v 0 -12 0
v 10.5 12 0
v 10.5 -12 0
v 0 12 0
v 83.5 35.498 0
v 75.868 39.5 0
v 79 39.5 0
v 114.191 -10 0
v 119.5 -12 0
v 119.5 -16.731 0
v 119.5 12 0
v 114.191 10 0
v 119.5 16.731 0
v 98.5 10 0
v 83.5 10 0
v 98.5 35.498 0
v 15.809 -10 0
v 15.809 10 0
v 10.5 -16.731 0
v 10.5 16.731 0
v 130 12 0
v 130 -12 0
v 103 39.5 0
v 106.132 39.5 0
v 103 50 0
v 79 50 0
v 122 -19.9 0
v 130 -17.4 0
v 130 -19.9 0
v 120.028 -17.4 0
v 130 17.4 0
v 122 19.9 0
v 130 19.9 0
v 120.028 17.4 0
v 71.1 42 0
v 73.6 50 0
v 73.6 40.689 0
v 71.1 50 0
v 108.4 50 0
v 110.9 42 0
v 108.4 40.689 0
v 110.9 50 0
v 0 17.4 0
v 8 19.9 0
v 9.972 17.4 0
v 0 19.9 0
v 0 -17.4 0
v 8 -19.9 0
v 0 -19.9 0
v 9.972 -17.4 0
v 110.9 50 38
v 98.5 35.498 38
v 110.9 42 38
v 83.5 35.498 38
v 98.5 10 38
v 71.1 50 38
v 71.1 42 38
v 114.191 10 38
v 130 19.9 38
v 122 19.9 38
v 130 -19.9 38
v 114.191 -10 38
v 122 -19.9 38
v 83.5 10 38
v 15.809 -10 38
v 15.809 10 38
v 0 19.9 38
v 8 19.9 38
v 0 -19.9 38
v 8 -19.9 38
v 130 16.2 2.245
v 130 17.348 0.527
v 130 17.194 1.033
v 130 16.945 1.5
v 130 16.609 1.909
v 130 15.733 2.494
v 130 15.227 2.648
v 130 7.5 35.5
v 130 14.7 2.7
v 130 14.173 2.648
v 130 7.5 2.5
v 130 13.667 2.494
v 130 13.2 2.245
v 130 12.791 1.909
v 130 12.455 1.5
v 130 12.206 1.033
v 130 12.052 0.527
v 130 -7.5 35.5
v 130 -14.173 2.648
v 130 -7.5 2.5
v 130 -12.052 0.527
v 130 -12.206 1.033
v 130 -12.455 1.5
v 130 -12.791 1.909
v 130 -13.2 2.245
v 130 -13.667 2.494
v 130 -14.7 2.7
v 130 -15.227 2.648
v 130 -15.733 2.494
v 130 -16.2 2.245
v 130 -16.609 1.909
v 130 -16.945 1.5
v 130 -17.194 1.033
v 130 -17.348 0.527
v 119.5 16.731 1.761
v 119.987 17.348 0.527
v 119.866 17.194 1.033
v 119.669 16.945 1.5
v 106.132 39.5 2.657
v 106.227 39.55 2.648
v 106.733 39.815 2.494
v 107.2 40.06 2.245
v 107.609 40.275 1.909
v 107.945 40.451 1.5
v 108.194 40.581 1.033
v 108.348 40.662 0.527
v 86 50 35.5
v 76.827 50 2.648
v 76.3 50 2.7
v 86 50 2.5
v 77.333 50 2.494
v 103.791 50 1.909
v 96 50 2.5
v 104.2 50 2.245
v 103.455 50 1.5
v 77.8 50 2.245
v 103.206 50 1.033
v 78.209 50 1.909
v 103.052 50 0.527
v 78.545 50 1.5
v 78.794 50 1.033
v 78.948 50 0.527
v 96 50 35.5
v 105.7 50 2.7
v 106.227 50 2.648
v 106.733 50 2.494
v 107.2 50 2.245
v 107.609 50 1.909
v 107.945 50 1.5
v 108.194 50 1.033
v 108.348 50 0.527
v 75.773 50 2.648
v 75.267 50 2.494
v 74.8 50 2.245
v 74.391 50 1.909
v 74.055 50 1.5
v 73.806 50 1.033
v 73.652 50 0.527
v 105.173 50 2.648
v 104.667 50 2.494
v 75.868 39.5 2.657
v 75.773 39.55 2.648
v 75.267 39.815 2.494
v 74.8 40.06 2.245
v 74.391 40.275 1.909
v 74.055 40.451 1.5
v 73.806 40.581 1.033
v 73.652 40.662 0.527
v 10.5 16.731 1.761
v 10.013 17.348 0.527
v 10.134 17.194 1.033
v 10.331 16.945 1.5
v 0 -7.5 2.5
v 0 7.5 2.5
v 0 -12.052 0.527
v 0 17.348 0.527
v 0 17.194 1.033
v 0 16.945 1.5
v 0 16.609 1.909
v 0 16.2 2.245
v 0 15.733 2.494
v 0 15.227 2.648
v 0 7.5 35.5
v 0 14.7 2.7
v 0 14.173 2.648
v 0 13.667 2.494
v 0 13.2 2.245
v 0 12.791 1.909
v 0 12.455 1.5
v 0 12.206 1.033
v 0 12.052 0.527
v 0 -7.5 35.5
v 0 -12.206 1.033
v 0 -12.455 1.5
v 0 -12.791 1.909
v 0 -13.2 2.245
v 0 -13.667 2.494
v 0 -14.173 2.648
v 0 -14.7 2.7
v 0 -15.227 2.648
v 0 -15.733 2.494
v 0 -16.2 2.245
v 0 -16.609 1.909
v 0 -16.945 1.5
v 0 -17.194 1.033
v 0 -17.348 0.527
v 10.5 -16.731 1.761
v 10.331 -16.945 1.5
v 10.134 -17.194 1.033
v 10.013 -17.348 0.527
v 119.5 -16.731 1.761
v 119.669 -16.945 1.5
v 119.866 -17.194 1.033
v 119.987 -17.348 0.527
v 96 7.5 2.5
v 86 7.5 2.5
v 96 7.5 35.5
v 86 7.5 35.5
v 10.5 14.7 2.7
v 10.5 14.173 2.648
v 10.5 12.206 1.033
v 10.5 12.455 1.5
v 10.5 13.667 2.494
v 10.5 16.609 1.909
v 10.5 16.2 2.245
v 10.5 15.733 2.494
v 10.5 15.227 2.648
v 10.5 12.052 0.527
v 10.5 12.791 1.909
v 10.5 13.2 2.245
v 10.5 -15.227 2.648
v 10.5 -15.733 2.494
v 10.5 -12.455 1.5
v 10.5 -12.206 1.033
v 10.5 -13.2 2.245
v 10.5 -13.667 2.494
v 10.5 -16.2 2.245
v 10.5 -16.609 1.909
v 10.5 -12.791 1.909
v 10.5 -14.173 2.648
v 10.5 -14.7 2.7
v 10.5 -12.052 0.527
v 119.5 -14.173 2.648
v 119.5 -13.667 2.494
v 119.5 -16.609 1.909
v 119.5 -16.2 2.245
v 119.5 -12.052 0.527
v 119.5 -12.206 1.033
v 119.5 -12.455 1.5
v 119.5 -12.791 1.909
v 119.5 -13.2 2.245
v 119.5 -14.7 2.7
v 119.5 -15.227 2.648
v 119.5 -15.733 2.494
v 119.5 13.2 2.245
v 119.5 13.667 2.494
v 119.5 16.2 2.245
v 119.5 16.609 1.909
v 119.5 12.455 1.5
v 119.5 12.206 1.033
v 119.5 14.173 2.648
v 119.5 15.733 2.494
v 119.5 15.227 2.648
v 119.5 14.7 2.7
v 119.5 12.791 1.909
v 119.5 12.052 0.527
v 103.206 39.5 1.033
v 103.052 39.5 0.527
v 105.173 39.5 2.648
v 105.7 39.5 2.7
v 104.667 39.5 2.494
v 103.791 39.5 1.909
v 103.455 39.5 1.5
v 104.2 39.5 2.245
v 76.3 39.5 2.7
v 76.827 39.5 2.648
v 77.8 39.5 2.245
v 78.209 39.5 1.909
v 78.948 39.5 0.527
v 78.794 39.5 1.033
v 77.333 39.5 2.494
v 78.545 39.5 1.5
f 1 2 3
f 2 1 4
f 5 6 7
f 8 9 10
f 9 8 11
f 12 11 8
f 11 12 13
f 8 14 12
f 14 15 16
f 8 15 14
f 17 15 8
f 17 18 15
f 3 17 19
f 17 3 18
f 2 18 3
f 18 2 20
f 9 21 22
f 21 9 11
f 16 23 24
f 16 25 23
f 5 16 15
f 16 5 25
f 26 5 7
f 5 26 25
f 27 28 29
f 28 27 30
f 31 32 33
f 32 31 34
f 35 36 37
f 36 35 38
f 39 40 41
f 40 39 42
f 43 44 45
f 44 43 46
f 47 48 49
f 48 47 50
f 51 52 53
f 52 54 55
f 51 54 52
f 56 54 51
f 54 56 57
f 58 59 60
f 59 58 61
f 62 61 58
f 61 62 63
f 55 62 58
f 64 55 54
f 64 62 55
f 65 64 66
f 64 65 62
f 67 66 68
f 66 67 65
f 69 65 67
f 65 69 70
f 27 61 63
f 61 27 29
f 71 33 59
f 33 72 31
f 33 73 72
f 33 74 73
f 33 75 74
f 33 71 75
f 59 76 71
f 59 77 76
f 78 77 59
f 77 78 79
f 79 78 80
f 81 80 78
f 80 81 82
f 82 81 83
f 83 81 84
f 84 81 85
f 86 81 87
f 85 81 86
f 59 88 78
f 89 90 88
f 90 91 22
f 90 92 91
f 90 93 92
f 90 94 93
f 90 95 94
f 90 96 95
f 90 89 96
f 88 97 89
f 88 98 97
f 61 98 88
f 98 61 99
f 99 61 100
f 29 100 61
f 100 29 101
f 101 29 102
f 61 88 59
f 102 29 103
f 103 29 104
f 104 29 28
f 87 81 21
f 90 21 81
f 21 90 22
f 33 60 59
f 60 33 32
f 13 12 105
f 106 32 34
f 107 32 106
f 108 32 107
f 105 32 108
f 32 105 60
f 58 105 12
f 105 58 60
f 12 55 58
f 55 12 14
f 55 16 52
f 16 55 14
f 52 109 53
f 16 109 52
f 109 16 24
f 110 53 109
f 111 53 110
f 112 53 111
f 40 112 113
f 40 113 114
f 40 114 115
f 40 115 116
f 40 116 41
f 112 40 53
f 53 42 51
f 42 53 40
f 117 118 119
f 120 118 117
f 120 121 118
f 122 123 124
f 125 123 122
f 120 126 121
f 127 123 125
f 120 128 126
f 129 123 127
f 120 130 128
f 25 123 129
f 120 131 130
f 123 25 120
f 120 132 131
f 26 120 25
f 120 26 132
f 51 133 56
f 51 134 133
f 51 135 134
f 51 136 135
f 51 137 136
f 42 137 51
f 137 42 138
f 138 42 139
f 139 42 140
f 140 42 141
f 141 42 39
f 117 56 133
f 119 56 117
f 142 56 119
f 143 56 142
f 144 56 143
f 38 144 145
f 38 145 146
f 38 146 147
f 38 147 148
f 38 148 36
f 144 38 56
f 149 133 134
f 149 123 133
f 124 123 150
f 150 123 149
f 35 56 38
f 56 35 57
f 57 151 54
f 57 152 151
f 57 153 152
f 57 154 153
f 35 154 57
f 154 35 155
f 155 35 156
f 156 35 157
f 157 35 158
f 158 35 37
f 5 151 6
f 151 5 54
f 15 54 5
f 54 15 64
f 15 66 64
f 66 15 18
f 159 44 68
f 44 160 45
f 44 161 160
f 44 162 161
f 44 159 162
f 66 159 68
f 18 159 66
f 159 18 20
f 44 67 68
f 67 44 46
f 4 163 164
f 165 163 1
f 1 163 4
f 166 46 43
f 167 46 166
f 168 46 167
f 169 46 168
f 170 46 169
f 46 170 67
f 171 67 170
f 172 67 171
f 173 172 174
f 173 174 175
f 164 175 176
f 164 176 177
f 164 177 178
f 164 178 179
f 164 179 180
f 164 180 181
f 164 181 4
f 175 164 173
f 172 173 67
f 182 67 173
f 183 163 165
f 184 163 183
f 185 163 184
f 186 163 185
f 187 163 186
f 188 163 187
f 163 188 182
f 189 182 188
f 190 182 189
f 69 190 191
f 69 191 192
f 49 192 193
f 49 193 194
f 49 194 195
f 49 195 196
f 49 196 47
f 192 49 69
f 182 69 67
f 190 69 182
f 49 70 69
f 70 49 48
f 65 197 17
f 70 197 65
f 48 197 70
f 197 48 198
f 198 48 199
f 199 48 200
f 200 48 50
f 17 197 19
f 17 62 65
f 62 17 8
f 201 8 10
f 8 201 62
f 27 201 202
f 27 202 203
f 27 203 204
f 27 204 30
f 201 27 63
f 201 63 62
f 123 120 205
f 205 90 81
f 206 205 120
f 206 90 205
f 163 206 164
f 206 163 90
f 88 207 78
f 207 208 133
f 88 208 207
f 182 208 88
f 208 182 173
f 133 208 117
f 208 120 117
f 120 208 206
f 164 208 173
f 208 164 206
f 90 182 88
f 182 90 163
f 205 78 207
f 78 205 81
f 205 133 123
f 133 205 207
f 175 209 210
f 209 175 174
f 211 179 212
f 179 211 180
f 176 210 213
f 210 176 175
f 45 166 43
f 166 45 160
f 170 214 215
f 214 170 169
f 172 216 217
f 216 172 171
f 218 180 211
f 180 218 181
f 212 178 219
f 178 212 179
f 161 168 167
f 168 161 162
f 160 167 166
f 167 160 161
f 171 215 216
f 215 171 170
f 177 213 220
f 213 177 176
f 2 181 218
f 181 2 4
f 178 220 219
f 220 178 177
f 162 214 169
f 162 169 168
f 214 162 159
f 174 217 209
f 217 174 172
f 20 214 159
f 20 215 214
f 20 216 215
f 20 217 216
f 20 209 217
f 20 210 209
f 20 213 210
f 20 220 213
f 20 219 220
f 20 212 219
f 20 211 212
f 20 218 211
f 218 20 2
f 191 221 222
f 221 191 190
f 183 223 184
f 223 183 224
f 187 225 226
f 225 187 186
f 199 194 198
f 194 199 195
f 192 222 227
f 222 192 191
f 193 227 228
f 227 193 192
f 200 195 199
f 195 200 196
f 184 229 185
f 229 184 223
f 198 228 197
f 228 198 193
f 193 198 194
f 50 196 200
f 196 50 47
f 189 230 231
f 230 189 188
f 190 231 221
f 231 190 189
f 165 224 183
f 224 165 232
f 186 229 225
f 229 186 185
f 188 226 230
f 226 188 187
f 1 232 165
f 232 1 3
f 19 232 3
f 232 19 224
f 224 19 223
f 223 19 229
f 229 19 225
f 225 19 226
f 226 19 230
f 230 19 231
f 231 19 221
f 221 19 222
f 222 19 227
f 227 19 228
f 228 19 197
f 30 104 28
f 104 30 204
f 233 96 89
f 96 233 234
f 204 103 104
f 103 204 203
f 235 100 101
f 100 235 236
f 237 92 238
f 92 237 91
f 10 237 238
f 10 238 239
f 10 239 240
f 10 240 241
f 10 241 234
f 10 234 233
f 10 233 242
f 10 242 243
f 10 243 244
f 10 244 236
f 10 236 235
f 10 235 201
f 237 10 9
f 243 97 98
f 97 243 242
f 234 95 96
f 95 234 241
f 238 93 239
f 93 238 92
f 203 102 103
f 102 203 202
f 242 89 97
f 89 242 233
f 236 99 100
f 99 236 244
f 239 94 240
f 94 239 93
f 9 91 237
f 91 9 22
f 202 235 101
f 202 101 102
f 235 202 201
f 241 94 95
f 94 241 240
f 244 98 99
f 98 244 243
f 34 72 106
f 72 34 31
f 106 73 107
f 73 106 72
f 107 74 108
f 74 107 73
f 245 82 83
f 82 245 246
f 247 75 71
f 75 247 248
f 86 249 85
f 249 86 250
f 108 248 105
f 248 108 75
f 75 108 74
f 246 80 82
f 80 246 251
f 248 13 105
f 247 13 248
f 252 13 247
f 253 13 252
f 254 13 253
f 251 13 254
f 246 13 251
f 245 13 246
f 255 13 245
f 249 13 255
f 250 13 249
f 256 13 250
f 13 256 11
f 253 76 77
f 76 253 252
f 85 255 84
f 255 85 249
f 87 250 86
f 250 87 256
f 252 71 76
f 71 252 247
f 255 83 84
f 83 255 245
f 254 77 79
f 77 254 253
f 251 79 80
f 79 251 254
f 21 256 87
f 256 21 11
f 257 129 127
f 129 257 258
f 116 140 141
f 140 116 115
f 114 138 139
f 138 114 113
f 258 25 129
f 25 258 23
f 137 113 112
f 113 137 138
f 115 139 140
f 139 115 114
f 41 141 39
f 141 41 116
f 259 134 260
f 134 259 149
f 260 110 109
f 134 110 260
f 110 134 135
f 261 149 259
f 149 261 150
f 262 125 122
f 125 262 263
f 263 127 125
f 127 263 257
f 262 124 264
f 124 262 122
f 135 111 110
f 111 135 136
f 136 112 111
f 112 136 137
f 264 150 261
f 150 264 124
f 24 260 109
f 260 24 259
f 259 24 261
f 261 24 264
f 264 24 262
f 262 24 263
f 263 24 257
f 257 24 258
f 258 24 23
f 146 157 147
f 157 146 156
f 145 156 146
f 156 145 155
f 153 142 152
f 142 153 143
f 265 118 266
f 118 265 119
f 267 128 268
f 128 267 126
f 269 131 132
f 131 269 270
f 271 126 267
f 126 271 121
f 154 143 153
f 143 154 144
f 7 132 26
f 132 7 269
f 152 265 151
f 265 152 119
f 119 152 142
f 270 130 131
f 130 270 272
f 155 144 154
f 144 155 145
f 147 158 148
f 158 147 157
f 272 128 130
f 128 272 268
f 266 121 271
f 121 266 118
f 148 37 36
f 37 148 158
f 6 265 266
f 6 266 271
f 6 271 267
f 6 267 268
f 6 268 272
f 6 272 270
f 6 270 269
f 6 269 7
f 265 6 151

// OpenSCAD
$fn = 32;

// ----------------------------------------------------------------------
// Air duct: 20 mm duct, 2.5 mm wall, 38 mm across
// ----------------------------------------------------------------------

// --- parameters (mm) ---
duct_r = 10;              // duct core radius
duct_d = 20;              // duct core diameter
wall = 2.5;               // duct wall thickness
height = 38;              // duct width (extrusion height)
port_r = 19.9;            // port flange half width
port_d = 39.8;            // port flange width
port_t = 8;               // port flange thickness
bolt_d = 5.4;             // port bolt holes
bolt_offset = 14.7;       // bolt hole offset from the port axis
branch_r = 7.5;           // branch core radius
branch_d = 15;            // branch core diameter
branch_len = 50;          // branch length from the run axis

difference() {
  /* outer hull chain: tube with a flat flange plate at every port */
  linear_extrude(height = 38) {
    hull() {
      polygon([[0, -19.9], [0, 19.9], [8, 19.9], [8, -19.9]]);
      translate([11, 0]) circle(r = 10);
    }
    hull() {
      translate([11, 0]) circle(r = 10);
      translate([39, 0]) circle(r = 10);
    }
    hull() {
      translate([39, 0]) circle(r = 10);
      translate([91, 0]) circle(r = 10);
    }
    hull() {
      translate([91, 0]) circle(r = 10);
      translate([119, 0]) circle(r = 10);
    }
    hull() {
      translate([119, 0]) circle(r = 10);
      polygon([[130, 19.9], [130, -19.9], [122, -19.9], [122, 19.9]]);
    }
    hull() {
      translate([91, 0]) circle(r = 7.5);
      translate([91, 27.5]) circle(r = 7.5);
    }
    hull() {
      translate([91, 27.5]) circle(r = 7.5);
      translate([91, 40]) circle(r = 7.5);
    }
    hull() {
      translate([91, 40]) circle(r = 7.5);
      polygon([[71.1, 50], [110.9, 50], [110.9, 42], [71.1, 42]]);
    }
  }
  /* air passage: the same chain inset by the wall, 5 mm proud of the ports */
  translate([0, 0, 2.5]) linear_extrude(height = 33) {
    hull() {
      translate([-5, 0]) circle(r = 7.5);
      translate([39, 0]) circle(r = 7.5);
    }
    hull() {
      translate([39, 0]) circle(r = 7.5);
      translate([91, 0]) circle(r = 7.5);
    }
    hull() {
      translate([91, 0]) circle(r = 7.5);
      translate([135, 0]) circle(r = 7.5);
    }
    hull() {
      translate([91, 0]) circle(r = 5);
      translate([91, 27.5]) circle(r = 5);
    }
    hull() {
      translate([91, 27.5]) circle(r = 5);
      translate([91, 55]) circle(r = 5);
    }
  }
  translate([0, 0]) rotate([0, 0, -90]) translate([-14.7, -2.5]) rotate([-90, 0, 0]) cylinder(h = 13, d = 5.4);
  translate([0, 0]) rotate([0, 0, -90]) translate([14.7, -2.5]) rotate([-90, 0, 0]) cylinder(h = 13, d = 5.4);
  translate([130, 0]) rotate([0, 0, 90]) translate([-14.7, -2.5]) rotate([-90, 0, 0]) cylinder(h = 13, d = 5.4);
  translate([130, 0]) rotate([0, 0, 90]) translate([14.7, -2.5]) rotate([-90, 0, 0]) cylinder(h = 13, d = 5.4);
  translate([91, 50]) rotate([0, 0, 180]) translate([-14.7, -2.5]) rotate([-90, 0, 0]) cylinder(h = 13, d = 5.4);
  translate([91, 50]) rotate([0, 0, 180]) translate([14.7, -2.5]) rotate([-90, 0, 0]) cylinder(h = 13, d = 5.4);
}
